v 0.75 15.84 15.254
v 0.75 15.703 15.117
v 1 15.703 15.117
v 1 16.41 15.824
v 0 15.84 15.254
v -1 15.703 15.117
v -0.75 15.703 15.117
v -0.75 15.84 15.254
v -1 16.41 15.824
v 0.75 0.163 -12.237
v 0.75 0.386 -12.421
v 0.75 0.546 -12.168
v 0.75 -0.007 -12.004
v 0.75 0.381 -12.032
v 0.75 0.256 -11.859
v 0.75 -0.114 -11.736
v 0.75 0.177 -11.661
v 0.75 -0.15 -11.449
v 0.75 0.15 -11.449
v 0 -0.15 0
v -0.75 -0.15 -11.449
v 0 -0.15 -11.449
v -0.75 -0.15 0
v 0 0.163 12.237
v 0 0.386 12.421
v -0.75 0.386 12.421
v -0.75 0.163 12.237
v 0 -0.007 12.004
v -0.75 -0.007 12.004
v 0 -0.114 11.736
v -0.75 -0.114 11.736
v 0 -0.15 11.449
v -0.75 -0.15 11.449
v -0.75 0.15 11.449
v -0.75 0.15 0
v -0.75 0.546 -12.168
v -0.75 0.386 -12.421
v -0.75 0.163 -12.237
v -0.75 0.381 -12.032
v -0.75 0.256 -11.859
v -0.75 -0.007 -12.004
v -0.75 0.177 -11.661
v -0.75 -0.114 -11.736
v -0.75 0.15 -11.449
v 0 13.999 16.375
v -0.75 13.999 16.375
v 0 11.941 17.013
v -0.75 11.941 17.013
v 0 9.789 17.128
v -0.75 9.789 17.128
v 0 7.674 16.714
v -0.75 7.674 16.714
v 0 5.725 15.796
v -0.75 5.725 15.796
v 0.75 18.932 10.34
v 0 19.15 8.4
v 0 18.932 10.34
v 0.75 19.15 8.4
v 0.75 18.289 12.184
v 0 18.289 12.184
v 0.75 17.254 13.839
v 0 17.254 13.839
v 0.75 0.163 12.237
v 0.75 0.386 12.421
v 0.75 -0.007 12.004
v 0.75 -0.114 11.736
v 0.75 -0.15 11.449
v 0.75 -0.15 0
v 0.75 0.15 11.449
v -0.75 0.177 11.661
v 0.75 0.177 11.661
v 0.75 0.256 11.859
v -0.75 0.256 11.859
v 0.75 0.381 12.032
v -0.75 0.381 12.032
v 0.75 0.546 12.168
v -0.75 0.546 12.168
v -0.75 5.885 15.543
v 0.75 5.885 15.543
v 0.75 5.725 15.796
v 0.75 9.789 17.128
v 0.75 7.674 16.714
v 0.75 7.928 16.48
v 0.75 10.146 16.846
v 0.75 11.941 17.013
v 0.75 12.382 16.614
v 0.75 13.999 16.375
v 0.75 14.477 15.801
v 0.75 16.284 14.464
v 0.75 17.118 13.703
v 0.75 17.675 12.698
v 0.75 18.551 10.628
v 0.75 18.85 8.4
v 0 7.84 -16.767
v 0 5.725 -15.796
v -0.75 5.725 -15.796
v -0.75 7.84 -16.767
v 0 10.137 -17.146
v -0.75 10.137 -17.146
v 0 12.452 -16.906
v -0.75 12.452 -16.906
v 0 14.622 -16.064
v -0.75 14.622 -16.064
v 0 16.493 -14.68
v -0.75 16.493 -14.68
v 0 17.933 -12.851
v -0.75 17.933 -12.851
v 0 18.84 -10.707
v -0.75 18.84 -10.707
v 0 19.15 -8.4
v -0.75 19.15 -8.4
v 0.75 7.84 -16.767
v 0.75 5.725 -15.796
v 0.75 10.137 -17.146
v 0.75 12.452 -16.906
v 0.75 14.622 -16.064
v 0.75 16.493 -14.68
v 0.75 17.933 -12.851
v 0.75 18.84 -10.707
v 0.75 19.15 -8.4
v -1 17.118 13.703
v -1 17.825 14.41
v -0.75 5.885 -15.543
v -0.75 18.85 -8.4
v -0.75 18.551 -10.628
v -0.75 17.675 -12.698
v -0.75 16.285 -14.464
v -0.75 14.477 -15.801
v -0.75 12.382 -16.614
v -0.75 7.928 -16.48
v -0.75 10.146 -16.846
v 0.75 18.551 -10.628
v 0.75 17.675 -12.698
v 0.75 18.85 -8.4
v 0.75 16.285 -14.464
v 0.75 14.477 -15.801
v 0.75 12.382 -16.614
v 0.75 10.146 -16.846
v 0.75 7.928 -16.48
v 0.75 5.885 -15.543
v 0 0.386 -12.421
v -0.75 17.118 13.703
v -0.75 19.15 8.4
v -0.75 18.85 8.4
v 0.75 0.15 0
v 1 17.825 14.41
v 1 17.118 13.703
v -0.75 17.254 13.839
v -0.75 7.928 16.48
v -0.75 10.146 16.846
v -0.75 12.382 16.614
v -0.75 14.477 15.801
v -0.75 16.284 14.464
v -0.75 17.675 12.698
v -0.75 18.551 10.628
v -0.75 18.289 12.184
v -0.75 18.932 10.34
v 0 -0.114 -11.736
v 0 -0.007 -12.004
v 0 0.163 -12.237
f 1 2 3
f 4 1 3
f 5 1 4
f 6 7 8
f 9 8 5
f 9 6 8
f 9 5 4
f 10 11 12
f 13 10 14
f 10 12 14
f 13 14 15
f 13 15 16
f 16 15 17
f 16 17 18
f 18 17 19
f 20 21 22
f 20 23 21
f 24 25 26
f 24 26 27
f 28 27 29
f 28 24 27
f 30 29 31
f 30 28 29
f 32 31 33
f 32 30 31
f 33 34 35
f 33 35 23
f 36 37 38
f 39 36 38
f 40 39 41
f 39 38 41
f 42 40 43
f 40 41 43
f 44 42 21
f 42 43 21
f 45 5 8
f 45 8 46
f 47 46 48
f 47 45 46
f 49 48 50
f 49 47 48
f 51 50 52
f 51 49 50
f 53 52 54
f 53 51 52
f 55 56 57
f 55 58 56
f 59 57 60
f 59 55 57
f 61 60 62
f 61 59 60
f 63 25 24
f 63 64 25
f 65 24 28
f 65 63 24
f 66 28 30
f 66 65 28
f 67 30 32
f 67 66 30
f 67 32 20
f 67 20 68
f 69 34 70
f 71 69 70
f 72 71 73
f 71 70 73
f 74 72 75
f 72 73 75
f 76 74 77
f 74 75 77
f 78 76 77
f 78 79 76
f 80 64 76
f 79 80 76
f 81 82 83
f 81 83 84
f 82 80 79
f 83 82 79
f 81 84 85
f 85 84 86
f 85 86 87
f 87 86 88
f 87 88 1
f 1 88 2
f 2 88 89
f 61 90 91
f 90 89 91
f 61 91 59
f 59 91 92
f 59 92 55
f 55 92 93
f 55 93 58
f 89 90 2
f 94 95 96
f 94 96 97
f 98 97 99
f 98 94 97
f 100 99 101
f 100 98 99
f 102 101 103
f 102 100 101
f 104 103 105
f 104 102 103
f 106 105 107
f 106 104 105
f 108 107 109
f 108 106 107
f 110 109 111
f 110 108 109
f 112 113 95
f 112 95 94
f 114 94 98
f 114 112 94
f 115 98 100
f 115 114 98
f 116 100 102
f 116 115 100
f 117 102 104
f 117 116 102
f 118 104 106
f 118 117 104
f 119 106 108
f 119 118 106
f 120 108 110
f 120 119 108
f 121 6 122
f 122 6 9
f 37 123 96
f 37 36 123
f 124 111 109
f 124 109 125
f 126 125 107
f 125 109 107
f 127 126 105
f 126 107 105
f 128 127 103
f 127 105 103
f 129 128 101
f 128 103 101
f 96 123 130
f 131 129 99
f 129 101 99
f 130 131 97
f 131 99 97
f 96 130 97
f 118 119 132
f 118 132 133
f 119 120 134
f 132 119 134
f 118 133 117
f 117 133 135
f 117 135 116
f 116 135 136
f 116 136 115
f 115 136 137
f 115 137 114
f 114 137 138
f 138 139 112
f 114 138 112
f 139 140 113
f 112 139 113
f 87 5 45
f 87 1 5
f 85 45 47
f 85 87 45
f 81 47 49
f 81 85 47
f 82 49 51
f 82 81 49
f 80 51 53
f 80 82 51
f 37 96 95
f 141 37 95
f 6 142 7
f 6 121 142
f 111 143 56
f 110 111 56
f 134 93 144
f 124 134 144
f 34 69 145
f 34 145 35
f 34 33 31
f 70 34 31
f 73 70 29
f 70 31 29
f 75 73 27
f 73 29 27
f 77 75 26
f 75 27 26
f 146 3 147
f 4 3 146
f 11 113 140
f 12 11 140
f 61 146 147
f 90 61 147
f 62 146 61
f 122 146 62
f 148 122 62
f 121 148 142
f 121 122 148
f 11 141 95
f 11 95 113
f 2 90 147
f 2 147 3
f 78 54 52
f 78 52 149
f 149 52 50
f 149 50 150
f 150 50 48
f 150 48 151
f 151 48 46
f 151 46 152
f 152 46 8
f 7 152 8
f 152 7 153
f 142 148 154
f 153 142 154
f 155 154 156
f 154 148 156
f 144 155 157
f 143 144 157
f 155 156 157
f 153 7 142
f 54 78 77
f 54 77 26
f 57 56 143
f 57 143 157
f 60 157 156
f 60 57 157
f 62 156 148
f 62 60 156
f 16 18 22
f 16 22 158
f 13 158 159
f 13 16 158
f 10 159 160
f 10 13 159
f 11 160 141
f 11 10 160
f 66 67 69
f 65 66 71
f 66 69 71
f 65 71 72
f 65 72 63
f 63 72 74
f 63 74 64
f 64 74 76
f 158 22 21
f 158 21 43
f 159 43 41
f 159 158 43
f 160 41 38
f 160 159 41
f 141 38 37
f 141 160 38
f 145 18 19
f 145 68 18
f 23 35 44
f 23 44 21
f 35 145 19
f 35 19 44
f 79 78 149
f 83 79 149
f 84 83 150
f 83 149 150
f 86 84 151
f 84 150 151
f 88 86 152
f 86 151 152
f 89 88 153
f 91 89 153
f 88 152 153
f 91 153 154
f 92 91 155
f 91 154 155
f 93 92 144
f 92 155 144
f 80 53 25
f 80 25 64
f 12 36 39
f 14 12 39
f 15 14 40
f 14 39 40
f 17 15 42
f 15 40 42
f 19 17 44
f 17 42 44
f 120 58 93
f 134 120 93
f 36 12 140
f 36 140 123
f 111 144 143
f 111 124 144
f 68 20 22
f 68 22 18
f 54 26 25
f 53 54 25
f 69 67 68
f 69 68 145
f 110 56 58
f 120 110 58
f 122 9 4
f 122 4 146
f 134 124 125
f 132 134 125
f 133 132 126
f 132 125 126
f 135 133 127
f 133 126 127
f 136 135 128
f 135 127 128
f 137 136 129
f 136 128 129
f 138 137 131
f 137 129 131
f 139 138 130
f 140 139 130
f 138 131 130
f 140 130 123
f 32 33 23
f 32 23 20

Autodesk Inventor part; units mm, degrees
ref_plane "YZ Plane" through (0, 0, 0) normal (1, 0, 0) x (0, 1, 0)
ref_plane "XZ Plane" through (0, 0, 0) normal (0, 1, 0) x (-1, 0, 0)
ref_plane "XY Plane" through (0, 0, 0) normal (0, 0, 1) x (1, 0, 0)
sketch "Sketch1" plane through (0, 0, 0) normal (0, 0, 1) x (1, 0, 0)
  line L0 (-0.75, 0.15) -> (0.75, 0.15)
  line L1 (0.75, 0.15) -> (0.75, -0.15)
  line L2 (0.75, -0.15) -> (-0.75, -0.15)
  line L3 (-0.75, -0.15) -> (-0.75, 0.15)
  line L4 (0, -0.2204) -> (0, 0)
  line L5 (0, 0) -> (0.3288, 0)
  dimension "d0" = 1.5
  dimension "d1" = 0.3
sketch3d "3D Sketch1"
  line L0 (0, 0, 0) -> (0, 0, 11.4491)
  arc A0 (0, 0, 11.4491) -> (0, 0.4657, 12.2944) centre (0, 1, 11.4491) ccw
  line L1 (0, 0.4657, 12.2944) -> (0, 5.8049, 15.6693)
  arc A1 (0, 5.8049, 15.6693) -> (0, 19, 8.4) centre (0, 10.4, 8.3999) ccw
  line L2 (0, 19, 8.4) -> (0, 19, -8.4)
  arc A2 (0, 19, -8.4) -> (0, 5.8048, -15.6694) centre (0, 10.4, -8.4) ccw
  line L3 (0, 5.8048, -15.6694) -> (0, 0.4657, -12.2944)
  arc A3 (0, 0.4657, -12.2944) -> (0, 0, -11.4491) centre (0, 1, -11.4491) ccw
  line L4 (0, 0, -11.4491) -> (0, 0, 0)
  dimension "d10" = 16.8
  dimension "d11" = 12
  dimension "d12" = 12
  dimension "d13" = 19
  dimension "d2" = 8.6
  dimension "d3" = 8.6
  dimension "d5" = 1
  dimension "d6" = 1
sweep "Sweep1" add profiles "Sketch1" path "3D Sketch1"
sketch "Sketch2" plane through (0, 0, 0) normal (1, 0, 0) x (0, 1, 0)
  line L0 (17.8246, 14.4103) -> (17.1175, 13.7032)
  line L1 (17.1175, 13.7032) -> (15.7033, 15.1174)
  line L2 (15.7033, 15.1174) -> (16.4104, 15.8245)
  line L3 (16.4104, 15.8245) -> (17.8246, 14.4103)
  arc A0 (18.85, 8.4) -> (5.8851, 15.5425) centre (10.4, 8.3999) ccw projected
  line L4 (10.4, 8.3999) -> (24.1814, 22.1813) construction
  line L5 (-0.15, -11.4491) -> (-0.15, 11.4491) construction
  point P0 (0, 0)
  point P1 (16.4104, 14.4103)
  point P2 (16.4104, 14.4103)
  dimension "d15" = 2
  dimension "d16" = 1
  dimension "d17" = 45
  dimension "d18" = 8.5
extrude "Extrusion1" add sketch "Sketch2" along normal mid plane 2
equation "\"d6\" = d5"
properties part number "battery_cord_2x" material "Polyester Yarn"
